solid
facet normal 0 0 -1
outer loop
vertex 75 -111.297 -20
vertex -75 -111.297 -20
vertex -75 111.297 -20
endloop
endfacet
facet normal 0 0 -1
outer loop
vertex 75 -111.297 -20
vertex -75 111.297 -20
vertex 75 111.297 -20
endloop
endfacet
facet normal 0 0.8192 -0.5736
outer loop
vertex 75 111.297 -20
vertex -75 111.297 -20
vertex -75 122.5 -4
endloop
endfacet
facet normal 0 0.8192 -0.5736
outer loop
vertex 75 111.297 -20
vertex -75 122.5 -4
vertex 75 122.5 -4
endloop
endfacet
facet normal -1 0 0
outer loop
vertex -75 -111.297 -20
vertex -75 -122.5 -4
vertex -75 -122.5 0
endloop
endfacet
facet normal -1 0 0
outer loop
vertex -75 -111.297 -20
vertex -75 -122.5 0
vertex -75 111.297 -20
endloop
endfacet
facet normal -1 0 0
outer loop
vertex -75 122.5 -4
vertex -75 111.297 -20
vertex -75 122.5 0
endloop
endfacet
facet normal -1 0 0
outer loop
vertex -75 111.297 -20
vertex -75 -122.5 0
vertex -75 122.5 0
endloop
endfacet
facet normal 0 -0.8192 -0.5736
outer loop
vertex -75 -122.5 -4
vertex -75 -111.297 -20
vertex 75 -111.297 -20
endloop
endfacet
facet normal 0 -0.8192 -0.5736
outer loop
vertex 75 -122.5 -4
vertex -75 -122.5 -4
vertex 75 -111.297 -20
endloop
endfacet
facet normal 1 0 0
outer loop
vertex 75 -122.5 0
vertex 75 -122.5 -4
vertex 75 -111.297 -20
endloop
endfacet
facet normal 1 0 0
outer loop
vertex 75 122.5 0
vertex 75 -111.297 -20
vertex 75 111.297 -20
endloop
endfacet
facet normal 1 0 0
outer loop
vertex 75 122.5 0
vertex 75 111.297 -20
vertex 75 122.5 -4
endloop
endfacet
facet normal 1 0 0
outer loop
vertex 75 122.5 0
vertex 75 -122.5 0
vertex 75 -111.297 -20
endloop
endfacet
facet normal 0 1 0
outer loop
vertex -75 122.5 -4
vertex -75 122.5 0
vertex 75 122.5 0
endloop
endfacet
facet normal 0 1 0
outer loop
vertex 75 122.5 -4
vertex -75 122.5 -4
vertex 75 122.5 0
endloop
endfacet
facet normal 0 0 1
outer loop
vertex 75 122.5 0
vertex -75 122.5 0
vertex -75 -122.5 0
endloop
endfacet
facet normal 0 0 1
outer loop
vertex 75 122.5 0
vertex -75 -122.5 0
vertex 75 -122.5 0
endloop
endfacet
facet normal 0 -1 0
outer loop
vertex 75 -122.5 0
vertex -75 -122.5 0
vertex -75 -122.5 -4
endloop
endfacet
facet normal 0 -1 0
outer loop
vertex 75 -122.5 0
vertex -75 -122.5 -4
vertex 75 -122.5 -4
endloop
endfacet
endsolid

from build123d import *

# Parameters (mm, degrees)
SKETCH_1_W             = 150
SKETCH_1_H             = 245
SM_BASE_FLANGE_1_DEPTH = 20
CHAMFER_1_SIZE         = 16
CHAMFER_1_SIZE2        = 11.203320611
CHAMFER_2_SIZE         = 16
CHAMFER_2_SIZE2        = 11.203320611


# Sheet-metal steps are written as plain solids
with BuildPart() as part:
    # Sketch 1 → 基体-法兰1 (new body)
    with BuildSketch(Plane.XY):
        Rectangle(SKETCH_1_W, SKETCH_1_H)
    extrude(amount=-SM_BASE_FLANGE_1_DEPTH)

    # 倒角1
    chamfer_1_edges = [part.edges().sort_by_distance(p)[0] for p in [
        (0, 122.5, -20),
    ]]
    chamfer_1_side = [part.faces().sort_by_distance(p)[0] for p in [
        (0, 122.5, -10),
    ]]
    chamfer(chamfer_1_edges, length=CHAMFER_1_SIZE, length2=CHAMFER_1_SIZE2, reference=chamfer_1_side[0])

    # 倒角2
    chamfer_2_edges = [part.edges().sort_by_distance(p)[0] for p in [
        (0, -122.5, -20),
    ]]
    chamfer_2_side = [part.faces().sort_by_distance(p)[0] for p in [
        (0, -122.5, -10),
    ]]
    chamfer(chamfer_2_edges, length=CHAMFER_2_SIZE, length2=CHAMFER_2_SIZE2, reference=chamfer_2_side[0])


solid = part.part
